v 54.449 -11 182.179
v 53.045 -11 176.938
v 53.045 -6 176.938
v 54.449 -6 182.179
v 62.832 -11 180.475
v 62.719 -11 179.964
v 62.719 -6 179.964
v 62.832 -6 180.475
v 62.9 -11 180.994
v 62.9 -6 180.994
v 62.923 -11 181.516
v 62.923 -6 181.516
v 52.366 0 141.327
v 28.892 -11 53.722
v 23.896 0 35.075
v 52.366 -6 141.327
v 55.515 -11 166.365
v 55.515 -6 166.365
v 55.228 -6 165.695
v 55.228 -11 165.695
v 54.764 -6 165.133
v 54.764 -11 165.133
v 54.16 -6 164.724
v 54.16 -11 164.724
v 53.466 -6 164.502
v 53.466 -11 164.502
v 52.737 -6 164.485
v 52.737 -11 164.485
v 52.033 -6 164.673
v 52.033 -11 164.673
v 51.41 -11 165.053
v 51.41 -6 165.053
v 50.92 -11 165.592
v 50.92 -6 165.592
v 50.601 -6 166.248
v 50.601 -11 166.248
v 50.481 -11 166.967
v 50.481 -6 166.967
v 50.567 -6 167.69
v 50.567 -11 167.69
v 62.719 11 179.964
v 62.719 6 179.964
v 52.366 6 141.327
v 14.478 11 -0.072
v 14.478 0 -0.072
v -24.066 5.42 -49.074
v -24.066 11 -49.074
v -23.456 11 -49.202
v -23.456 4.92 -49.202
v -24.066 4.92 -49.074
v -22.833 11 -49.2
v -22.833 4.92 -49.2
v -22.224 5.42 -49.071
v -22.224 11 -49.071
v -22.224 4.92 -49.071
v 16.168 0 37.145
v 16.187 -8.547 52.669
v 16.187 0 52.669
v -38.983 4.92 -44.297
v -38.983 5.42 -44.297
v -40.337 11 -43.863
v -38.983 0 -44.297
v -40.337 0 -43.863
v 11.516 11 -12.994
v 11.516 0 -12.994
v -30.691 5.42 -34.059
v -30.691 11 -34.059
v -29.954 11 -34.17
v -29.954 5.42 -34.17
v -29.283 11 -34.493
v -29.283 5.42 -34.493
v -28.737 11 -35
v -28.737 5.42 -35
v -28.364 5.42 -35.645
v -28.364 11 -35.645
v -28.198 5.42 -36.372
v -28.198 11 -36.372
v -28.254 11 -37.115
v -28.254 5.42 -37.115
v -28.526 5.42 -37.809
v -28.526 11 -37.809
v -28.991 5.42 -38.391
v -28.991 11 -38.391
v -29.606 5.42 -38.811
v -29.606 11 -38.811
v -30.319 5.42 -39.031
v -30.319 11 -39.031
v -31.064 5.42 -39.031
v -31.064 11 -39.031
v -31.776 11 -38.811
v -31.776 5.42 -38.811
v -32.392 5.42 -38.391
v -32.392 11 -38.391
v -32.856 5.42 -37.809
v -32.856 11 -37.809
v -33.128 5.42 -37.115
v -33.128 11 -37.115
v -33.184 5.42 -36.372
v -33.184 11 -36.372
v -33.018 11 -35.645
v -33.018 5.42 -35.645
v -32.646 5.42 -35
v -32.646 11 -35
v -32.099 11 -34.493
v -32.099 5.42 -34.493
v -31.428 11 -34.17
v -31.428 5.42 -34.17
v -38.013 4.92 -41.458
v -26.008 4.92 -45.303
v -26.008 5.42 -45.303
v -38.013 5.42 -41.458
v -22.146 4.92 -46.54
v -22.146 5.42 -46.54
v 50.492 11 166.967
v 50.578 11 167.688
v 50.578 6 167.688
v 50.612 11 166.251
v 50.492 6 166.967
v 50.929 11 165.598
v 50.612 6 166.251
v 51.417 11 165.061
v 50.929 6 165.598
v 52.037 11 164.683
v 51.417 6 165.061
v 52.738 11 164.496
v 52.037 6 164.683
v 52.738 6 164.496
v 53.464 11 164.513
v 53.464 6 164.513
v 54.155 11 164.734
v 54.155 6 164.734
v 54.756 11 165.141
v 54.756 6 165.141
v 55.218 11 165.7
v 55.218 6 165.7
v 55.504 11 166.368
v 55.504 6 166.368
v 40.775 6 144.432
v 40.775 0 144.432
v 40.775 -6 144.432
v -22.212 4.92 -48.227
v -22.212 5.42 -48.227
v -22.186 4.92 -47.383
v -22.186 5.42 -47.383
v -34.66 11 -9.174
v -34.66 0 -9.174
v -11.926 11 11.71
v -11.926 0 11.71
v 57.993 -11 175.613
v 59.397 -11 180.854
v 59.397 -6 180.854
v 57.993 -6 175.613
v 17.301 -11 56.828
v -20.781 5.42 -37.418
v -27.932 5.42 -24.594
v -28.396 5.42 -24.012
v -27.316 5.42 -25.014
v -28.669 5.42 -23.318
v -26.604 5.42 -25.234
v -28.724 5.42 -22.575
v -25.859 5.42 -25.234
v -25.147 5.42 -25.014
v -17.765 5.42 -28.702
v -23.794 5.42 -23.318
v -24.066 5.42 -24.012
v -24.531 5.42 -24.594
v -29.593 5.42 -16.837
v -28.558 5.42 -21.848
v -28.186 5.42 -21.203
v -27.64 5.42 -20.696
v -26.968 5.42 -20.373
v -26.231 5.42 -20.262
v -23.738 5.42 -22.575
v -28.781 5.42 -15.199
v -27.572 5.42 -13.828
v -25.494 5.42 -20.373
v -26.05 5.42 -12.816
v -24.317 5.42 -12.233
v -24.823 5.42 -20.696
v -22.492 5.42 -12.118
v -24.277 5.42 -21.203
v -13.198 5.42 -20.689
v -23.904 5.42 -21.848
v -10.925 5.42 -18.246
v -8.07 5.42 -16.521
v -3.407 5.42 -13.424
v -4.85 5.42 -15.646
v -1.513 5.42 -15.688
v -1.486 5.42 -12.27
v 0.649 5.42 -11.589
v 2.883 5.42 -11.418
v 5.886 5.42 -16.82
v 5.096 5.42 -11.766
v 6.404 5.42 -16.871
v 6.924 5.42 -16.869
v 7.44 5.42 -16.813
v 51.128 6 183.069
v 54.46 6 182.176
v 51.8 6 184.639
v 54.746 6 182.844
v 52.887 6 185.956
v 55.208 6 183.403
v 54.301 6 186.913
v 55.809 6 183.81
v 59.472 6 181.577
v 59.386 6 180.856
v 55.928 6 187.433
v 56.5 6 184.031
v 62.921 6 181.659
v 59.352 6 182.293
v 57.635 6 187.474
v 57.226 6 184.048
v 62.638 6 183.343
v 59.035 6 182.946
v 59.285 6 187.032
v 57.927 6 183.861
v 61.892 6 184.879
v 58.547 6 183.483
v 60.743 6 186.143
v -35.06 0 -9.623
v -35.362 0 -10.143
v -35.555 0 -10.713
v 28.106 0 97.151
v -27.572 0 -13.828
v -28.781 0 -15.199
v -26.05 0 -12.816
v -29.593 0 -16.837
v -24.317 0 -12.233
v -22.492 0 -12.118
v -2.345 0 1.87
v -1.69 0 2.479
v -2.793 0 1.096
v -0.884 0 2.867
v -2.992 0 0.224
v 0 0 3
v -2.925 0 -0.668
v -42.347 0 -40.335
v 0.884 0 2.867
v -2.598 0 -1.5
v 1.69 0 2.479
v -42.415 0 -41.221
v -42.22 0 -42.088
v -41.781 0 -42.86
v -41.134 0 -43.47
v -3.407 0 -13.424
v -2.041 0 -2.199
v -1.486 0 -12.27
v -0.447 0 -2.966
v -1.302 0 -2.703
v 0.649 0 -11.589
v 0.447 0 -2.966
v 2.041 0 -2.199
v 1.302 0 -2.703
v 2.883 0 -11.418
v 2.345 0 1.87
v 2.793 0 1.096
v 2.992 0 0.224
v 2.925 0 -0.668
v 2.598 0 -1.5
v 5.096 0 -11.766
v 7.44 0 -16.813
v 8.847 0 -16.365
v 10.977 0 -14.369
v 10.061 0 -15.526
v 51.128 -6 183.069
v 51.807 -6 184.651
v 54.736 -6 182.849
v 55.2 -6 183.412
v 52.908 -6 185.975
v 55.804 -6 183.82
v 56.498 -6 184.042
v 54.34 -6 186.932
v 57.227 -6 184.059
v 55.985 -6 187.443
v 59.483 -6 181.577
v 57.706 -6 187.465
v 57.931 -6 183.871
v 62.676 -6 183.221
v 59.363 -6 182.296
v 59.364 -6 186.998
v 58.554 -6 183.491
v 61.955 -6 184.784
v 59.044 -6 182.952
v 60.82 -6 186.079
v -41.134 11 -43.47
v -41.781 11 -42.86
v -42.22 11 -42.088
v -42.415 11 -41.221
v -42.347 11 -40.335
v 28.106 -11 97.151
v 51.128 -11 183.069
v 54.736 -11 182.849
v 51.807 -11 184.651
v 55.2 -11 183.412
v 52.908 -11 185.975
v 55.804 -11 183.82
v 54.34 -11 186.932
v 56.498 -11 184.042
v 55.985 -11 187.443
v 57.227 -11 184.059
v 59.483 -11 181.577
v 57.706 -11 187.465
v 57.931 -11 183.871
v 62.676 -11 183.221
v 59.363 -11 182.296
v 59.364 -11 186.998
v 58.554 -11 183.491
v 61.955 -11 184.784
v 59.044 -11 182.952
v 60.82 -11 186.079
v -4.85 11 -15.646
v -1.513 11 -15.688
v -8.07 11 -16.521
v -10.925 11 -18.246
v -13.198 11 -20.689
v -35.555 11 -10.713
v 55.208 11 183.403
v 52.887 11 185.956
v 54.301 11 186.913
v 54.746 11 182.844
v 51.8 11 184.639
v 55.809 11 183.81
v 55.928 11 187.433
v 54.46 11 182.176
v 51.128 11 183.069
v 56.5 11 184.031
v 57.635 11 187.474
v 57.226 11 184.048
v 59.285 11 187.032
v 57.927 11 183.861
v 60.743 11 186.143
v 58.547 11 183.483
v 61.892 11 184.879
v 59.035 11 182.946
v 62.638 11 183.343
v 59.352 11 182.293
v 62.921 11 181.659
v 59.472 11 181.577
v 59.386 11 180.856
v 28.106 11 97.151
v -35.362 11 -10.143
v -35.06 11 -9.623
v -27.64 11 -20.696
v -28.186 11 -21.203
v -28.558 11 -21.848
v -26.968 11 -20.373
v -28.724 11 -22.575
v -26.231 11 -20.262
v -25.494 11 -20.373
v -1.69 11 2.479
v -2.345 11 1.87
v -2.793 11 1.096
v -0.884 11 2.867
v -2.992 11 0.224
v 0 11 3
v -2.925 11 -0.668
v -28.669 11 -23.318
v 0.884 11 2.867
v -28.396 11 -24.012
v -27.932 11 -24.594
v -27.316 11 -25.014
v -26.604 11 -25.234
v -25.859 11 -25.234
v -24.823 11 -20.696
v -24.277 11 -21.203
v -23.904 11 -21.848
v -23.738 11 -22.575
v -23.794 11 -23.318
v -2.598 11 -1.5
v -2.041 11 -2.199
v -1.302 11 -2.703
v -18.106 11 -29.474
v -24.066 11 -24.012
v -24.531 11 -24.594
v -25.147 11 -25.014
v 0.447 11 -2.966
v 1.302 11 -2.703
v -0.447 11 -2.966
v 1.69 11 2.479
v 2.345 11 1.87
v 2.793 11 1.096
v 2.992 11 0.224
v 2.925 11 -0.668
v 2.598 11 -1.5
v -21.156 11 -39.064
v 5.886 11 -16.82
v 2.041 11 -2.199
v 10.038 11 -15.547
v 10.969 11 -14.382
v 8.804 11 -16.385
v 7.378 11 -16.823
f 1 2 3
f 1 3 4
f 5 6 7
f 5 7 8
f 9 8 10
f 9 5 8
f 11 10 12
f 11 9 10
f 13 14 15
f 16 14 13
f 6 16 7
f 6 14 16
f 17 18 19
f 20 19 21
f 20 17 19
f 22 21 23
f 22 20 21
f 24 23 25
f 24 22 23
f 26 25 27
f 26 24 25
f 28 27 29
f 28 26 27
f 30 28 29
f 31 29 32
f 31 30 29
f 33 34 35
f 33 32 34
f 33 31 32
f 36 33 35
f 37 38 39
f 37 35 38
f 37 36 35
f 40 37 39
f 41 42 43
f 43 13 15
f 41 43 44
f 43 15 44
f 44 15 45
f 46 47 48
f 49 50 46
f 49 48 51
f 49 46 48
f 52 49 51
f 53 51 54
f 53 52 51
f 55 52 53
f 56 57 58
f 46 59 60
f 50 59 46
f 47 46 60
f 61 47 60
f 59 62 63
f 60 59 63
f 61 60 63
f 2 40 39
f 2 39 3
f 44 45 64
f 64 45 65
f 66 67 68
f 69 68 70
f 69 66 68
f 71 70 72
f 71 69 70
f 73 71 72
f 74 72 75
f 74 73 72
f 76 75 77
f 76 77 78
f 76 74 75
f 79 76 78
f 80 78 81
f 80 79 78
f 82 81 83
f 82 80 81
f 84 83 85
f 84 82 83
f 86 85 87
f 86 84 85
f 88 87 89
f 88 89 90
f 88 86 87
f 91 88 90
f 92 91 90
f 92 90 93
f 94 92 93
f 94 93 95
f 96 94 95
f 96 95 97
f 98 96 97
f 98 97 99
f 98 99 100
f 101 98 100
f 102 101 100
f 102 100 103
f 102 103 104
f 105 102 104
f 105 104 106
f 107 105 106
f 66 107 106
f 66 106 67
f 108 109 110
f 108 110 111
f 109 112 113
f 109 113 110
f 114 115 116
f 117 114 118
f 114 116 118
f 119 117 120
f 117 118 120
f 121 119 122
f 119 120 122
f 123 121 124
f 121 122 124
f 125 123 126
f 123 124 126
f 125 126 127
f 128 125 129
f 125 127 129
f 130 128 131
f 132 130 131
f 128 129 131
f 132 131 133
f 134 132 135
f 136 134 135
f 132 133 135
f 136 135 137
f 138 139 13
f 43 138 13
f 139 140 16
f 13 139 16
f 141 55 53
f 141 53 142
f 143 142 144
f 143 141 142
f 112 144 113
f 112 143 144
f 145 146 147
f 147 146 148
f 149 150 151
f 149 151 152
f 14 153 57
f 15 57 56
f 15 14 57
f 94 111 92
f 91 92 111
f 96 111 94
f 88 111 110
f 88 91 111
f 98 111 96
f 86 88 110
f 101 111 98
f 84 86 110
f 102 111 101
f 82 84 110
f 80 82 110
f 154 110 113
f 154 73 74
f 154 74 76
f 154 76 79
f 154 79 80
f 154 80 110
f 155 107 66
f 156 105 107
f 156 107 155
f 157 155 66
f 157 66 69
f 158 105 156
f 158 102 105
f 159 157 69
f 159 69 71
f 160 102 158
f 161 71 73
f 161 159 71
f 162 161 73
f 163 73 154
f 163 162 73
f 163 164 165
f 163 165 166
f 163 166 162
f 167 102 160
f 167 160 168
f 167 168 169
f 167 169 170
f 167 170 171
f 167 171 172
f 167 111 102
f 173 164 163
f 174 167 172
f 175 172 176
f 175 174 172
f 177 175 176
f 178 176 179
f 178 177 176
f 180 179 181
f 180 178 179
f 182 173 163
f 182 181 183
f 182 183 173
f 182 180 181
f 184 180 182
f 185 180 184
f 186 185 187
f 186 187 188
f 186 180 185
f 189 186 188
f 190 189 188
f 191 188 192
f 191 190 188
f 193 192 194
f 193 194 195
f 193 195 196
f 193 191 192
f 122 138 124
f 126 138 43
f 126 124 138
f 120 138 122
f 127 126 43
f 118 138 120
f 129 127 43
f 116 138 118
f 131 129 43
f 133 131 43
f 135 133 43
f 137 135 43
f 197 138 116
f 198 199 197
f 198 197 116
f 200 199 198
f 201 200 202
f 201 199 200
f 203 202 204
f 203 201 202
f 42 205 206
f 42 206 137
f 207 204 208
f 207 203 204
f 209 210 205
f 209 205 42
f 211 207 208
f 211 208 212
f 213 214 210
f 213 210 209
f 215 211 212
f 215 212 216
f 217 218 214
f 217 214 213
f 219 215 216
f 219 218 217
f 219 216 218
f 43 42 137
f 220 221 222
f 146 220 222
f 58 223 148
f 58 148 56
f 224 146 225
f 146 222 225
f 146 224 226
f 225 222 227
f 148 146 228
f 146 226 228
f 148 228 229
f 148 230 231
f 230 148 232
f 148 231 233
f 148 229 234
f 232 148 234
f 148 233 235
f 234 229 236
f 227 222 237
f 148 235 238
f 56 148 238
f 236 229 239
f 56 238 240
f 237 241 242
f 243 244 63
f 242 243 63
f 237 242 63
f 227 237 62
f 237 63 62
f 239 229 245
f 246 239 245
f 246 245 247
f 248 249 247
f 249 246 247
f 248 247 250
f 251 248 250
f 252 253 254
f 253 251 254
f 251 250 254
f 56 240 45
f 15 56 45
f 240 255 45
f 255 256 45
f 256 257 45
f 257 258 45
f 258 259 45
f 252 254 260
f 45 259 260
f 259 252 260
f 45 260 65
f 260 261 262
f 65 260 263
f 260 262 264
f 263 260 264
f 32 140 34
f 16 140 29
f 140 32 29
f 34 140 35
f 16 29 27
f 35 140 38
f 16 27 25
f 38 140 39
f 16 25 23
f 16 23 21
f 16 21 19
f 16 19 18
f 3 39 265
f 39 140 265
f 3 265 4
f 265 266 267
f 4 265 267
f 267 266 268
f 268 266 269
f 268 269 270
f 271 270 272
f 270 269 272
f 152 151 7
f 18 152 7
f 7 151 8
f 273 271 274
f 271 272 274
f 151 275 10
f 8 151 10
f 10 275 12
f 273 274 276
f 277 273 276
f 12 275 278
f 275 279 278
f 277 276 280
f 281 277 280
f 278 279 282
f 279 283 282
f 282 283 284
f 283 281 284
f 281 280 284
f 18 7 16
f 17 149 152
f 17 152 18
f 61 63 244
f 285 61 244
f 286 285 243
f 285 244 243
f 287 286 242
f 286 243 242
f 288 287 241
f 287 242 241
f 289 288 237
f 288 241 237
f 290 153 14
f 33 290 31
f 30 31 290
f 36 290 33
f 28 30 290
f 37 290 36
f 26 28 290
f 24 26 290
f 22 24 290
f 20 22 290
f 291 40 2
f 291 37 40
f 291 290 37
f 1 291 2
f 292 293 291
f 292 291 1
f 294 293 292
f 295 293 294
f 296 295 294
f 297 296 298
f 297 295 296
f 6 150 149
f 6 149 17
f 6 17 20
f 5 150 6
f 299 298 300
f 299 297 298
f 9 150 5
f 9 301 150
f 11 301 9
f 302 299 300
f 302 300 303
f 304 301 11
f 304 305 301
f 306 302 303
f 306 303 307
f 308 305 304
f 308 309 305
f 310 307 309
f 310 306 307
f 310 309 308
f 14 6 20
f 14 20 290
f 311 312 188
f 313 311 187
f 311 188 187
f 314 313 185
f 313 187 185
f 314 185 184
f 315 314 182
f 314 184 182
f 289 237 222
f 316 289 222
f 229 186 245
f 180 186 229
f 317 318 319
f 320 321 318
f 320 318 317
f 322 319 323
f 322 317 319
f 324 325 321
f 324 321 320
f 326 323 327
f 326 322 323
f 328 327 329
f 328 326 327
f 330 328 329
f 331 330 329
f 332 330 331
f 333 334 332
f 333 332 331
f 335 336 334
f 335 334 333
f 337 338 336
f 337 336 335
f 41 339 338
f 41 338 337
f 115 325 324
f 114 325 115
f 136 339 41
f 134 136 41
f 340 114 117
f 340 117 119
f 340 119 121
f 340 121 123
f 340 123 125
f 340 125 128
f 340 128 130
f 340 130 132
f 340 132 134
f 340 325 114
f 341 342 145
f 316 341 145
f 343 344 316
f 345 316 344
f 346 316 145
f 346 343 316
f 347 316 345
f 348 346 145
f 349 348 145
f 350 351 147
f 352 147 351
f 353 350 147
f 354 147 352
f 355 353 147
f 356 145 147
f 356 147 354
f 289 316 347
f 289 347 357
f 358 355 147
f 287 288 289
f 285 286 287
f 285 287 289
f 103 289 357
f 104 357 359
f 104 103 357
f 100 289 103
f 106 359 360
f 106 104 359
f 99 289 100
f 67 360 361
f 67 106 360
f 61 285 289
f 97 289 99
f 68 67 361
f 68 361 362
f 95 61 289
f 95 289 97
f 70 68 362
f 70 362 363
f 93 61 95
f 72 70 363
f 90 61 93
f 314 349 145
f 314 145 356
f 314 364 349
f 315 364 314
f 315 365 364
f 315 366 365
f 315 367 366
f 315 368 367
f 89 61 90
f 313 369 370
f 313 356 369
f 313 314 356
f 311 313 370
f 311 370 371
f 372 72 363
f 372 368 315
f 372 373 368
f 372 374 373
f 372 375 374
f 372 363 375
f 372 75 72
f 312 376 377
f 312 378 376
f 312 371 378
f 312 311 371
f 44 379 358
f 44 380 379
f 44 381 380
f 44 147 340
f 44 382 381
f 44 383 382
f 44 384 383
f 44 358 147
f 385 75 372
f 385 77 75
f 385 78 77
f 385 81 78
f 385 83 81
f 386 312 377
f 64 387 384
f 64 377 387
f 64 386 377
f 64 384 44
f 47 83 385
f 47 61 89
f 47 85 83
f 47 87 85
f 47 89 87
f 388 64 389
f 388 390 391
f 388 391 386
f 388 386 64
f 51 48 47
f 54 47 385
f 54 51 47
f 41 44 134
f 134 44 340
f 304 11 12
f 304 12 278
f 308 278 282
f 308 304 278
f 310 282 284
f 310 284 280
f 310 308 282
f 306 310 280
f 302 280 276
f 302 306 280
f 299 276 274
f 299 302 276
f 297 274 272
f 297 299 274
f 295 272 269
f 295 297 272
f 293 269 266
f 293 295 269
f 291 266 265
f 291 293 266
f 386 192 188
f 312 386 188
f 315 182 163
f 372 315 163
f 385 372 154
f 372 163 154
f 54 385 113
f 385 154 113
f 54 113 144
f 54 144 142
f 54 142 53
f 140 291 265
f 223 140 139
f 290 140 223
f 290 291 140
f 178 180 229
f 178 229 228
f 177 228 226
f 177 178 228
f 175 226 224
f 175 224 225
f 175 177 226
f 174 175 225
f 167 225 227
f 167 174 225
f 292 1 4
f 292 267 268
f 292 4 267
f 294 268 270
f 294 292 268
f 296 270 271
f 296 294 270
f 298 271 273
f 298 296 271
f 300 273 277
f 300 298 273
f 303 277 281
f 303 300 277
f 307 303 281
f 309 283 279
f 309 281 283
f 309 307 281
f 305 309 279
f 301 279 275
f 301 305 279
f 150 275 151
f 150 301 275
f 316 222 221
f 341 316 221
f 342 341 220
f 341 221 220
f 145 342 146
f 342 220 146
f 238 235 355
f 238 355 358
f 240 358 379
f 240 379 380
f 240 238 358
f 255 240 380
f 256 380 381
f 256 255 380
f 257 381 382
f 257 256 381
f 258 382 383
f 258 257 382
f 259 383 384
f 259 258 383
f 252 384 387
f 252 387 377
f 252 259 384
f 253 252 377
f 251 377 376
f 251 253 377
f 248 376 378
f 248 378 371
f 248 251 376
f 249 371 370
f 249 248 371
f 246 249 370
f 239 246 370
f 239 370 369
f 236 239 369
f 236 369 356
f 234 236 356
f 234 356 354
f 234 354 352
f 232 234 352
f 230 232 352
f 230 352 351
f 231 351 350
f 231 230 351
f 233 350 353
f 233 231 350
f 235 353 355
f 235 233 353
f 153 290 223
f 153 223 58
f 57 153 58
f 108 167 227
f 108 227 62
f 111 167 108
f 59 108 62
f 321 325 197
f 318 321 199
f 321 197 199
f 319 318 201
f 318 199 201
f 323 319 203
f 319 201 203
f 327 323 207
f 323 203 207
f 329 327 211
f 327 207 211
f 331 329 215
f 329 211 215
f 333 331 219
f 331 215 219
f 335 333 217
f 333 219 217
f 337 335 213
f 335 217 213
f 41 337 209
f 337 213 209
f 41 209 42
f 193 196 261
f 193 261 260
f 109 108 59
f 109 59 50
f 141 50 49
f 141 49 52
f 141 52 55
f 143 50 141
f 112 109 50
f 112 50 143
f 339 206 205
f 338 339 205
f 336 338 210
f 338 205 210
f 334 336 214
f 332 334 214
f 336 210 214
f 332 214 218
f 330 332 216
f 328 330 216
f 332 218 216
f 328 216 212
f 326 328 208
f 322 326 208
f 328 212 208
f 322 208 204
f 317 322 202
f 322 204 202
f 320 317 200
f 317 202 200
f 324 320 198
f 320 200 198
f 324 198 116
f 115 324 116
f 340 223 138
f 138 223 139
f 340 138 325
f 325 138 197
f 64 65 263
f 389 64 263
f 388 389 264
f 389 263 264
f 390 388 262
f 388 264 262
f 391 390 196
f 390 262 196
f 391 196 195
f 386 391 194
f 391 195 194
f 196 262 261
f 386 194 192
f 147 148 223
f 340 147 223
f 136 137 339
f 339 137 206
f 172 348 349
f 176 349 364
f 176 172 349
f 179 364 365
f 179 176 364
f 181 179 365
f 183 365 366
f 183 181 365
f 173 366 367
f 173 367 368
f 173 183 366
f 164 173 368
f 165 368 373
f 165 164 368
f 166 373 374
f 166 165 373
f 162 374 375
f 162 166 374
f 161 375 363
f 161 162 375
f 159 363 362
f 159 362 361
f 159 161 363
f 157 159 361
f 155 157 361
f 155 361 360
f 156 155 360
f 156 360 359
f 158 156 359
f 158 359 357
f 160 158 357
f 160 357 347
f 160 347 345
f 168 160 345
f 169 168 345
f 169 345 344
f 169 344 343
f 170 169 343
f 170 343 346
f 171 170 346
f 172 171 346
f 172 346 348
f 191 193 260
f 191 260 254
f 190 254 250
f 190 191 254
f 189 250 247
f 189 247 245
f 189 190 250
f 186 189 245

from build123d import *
from build123d.topology import SkipClean

# Parameters (mm, degrees)
SKETCH1_R              = 2.5
SKETCH1_R_2            = 3
BOSS_EXTRUDE1_DEPTH    = 11
BOSS_EXTRUDE2_START    = 11
BOSS_EXTRUDE2_DEPTH    = 11
CUT_EXTRUDE8_START     = -5.42
CUT_EXTRUDE8_OUTLINE_R = 2.5
CUT_EXTRUDE8_DEPTH     = 5.42
CUT_EXTRUDE9_DEPTH     = 200.464537277
SKETCH22_W             = 1.692224542
SKETCH22_H             = 1
BOSS_EXTRUDE5_DEPTH    = 5.58
BOSS_EXTRUDE6_START    = 0.5
BOSS_EXTRUDE6_DEPTH    = 0.5
CUT_EXTRUDE11_START    = -5
CUT_EXTRUDE11_DEPTH    = 12
CUT_EXTRUDE12_DEPTH    = 11


# Read off the part's stored shape, not the designer's step: Cut-Extrude8
with BuildPart() as part:
    # Sketch1 → Boss-Extrude1 (new body)
    with BuildSketch(Plane(origin=(0, 0, 0), x_dir=(1, 0, 0), z_dir=(0, 1, 0))):
        with BuildLine():
            Line((-24.065911245, 49.074379963), (-40.33748217, 43.862823975))
            ThreePointArc((-40.33748217, 43.862823975), (-42.029254381, 42.490505115), (-42.346540309, 40.335352706))
            Line((-42.346540309, 40.335352706), (-35.554744394, 10.712738062))
            ThreePointArc((-35.554744394, 10.712738062), (-35.224207157, 9.875429138), (-34.660148596, 9.173874408))
            Line((-34.660148596, 9.173874408), (-11.926083617, -11.710336344))
            Line((-11.926083617, -11.710336344), (28.105920068, -97.151333217))
            Line((28.105920068, -97.151333217), (51.127586716, -183.069362819))
            ThreePointArc((51.127586716, -183.069362819), (58.476055497, -187.312004338), (62.718696966, -179.963535528))
            Line((62.718696966, -179.963535528), (14.478423579, 0.071615722))
            Line((14.478423579, 0.071615722), (11.515517153, 12.994417934))
            ThreePointArc((11.515517153, 12.994417934), (9.45213952, 16.012597514), (5.886229377, 16.819579599))
            Line((5.886229377, 16.819579599), (-1.513417826, 15.688133083))
            ThreePointArc((-1.513417826, 15.688133083), (-8.06952351, 16.520767077), (-13.198183321, 20.688818137))
            ThreePointArc((-13.198183321, 20.688818137), (-19.873214701, 34.19205636), (-22.223775344, 49.070508937))
            ThreePointArc((-22.223775344, 49.070508937), (-23.144538818, 49.217338163), (-24.065911245, 49.074379963))
        make_face()
        with BuildLine():
            ThreePointArc((59.386252708, -180.856460648), (57.583130416, -183.97956007), (54.460030994, -182.176437778))
            Line((54.460030994, -182.176437778), (50.577745318, -167.687550384))
            ThreePointArc((50.577745318, -167.687550384), (52.38086761, -164.564450962), (55.503967032, -166.367573254))
            Line((55.503967032, -166.367573254), (59.386252708, -180.856460648))
        make_face(mode=Mode.SUBTRACT)
        with Locations(Location((-26.231262377, 22.76176979, 0), (0, 0, 270))):
            Circle(SKETCH1_R, mode=Mode.SUBTRACT)
        with BuildLine():
            Line((-32.594396249, 32.813795701), (-31.813835797, 32.992760568))
            ThreePointArc((-31.813835797, 32.992760568), (-32.198538906, 32.878953378), (-32.594396249, 32.813795701))
        make_face(mode=Mode.SUBTRACT)
        with Locations(Location((-30.69116896, 36.558843149, 0), (0, 0, 270))):
            Circle(SKETCH1_R, mode=Mode.SUBTRACT)
        with Locations(Location((0, 0, 0), (0, 0, 270))):
            Circle(SKETCH1_R_2, mode=Mode.SUBTRACT)
    extrude(amount=BOSS_EXTRUDE1_DEPTH)

    # Sketch15 → Boss-Extrude2 (add)
    with SkipClean():  # the faces are left unmerged after this step: merging them gives an invalid solid
        with BuildSketch(Plane.XZ.offset(BOSS_EXTRUDE2_START)):
            with BuildLine():
                ThreePointArc((62.718696809, 179.963534942), (60.986991622, 177.102253359), (57.992587901, 175.612528046))
                Line((57.992587901, 175.612528046), (55.514643215, 166.364712579))
                ThreePointArc((55.514643215, 166.364712579), (52.378006935, 164.553774778), (50.567069134, 167.690411058))
                Line((50.567069134, 167.690411058), (53.04501382, 176.938226526))
                ThreePointArc((53.04501382, 176.938226526), (51.196646785, 179.725568352), (51.127586894, 183.069363484))
                Line((51.127586894, 183.069363484), (28.105920068, 97.151333217))
                Line((28.105920068, 97.151333217), (12.304730128, 38.18048954))
                Line((12.304730128, 38.18048954), (23.895840044, 35.074660999))
                Line((23.895840044, 35.074660999), (62.718696809, 179.963534942))
            make_face()
            with BuildLine():
                ThreePointArc((54.449354811, 182.179298453), (57.585991091, 183.990236254), (59.396928892, 180.853599973))
                Line((59.396928892, 180.853599973), (57.992587901, 175.612528046))
                ThreePointArc((57.992587901, 175.612528046), (60.986991622, 177.102253359), (62.718696809, 179.963534942))
                ThreePointArc((62.718696809, 179.963534942), (62.87181102, 180.73329206), (62.923141851, 181.516449213))
                ThreePointArc((62.923141851, 181.516449213), (57.706299005, 187.465118381), (51.127586894, 183.069363484))
                ThreePointArc((51.127586894, 183.069363484), (51.196646785, 179.725568352), (53.04501382, 176.938226526))
                Line((53.04501382, 176.938226526), (54.449354811, 182.179298453))
            make_face()
        extrude(amount=-BOSS_EXTRUDE2_DEPTH)

    # Cut-Extrude8 outline → Cut-Extrude8 (cut)
    with SkipClean():  # the faces are left unmerged after this step: merging them gives an invalid solid
        with BuildSketch(Plane.XZ.offset(CUT_EXTRUDE8_START)):
            with BuildLine():
                Line((7.440475273, -16.812852061), (5.096097174, -11.765824195))
                ThreePointArc((5.096097174, -11.765824195), (0.648562626, -11.588913559), (-3.406606041, -13.423979773))
                Line((-3.406606041, -13.423979773), (-22.492177879, -12.118359456))
                ThreePointArc((-22.492177879, -12.118359456), (-26.84408445, -13.271868588), (-29.593378831, -16.837125174))
                Line((-29.593378831, -16.837125174), (-38.983226386, -44.296573112))
                Line((-38.983226386, -44.296573112), (-24.065911245, -49.074379963))
                ThreePointArc((-24.065911245, -49.074379963), (-23.144538818, -49.217338163), (-22.223775344, -49.070508937))
                ThreePointArc((-22.223775344, -49.070508937), (-19.873214666, -34.19205625), (-13.198183188, -20.688817948))
                ThreePointArc((-13.198183188, -20.688817948), (-8.069523818, -16.520767209), (-1.513418717, -15.688132947))
                Line((-1.513418717, -15.688132947), (5.886229377, -16.819579599))
                ThreePointArc((5.886229377, -16.819579599), (6.663615332, -16.876977606), (7.440475273, -16.812852061))
            make_face()
            with Locations((-30.69116896, -36.558843149)):
                Circle(CUT_EXTRUDE8_OUTLINE_R, mode=Mode.SUBTRACT)
            with BuildLine():
                Line((-31.813835797, -32.992760568), (-32.594396249, -32.813795701))
                ThreePointArc((-32.594396249, -32.813795701), (-32.198538906, -32.878953378), (-31.813835797, -32.992760568))
            make_face(mode=Mode.SUBTRACT)
            with Locations((-26.231262377, -22.76176979)):
                Circle(CUT_EXTRUDE8_OUTLINE_R, mode=Mode.SUBTRACT)
        extrude(amount=CUT_EXTRUDE8_DEPTH, mode=Mode.SUBTRACT)

    # Sketch19 → Cut-Extrude9 (cut, through all)
    with SkipClean():  # the faces are left unmerged after this step: merging them gives an invalid solid
        with BuildSketch(Plane(origin=(13.526457033, 0, -3.624403239), x_dir=(-0.2588190451025201, 0, -0.9659258262890685), z_dir=(0.9659258262890686, 0, -0.2588190451025201))):
            Polygon((-59.369639824, -11), (-40.064219409, 0), (-40.064219409, -11), align=None)
        extrude(amount=-CUT_EXTRUDE9_DEPTH, mode=Mode.SUBTRACT)

    # Sketch22 → Boss-Extrude5 (add, through all)
    with SkipClean():  # the faces are left unmerged after this step: merging them gives an invalid solid
        with BuildSketch(Plane.XZ.offset(-5.42)):
            with Locations((-32.253882585, -32.818926128)):
                Rectangle(SKETCH22_W, SKETCH22_H)
        extrude(amount=-BOSS_EXTRUDE5_DEPTH)

    # Sketch23 → Boss-Extrude6 (add)
    with SkipClean():  # the faces are left unmerged after this step: merging them gives an invalid solid
        with BuildSketch(Plane.XZ.offset(-5.42).offset(BOSS_EXTRUDE6_START)):
            with BuildLine():
                Line((-26.008052503, -45.302821126), (-38.012549647, -41.457949032))
                Line((-38.012549647, -41.457949032), (-38.983226386, -44.296573112))
                Line((-38.983226386, -44.296573112), (-24.065911245, -49.074379963))
                ThreePointArc((-24.065911245, -49.074379963), (-25.817991998, -47.590776952), (-26.008052503, -45.302821126))
            make_face()
            with BuildLine():
                Line((-22.14579331, -46.539848584), (-26.008052503, -45.302821126))
                ThreePointArc((-26.008052503, -45.302821126), (-25.817991998, -47.590776952), (-24.065911245, -49.074379963))
                ThreePointArc((-24.065911245, -49.074379963), (-23.144538818, -49.217338163), (-22.223775344, -49.070508937))
                ThreePointArc((-22.223775344, -49.070508937), (-22.200805099, -47.804685082), (-22.14579331, -46.539848584))
            make_face()
        extrude(amount=-BOSS_EXTRUDE6_DEPTH)

    # Sketch26 → Cut-Extrude11 (cut)
    with BuildSketch(Plane.XZ.offset(11).offset(CUT_EXTRUDE11_START)):
        Polygon((184.237099145, 679.840826179), (51.127586894, 183.069363484), (40.774825089, 144.432330432), (52.365935005, 141.326501891), (62.718696809, 179.963534942), (195.828209061, 676.734997637), (462.047233565, 1670.277923027), (450.456123649, 1673.383751569), align=None)
    extrude(amount=-CUT_EXTRUDE11_DEPTH, mode=Mode.SUBTRACT)

    # Sketch27 → Cut-Extrude12 (cut)
    with BuildSketch(Plane.XZ.offset(11)):
        Polygon((12.304730128, 38.18048954), (16.187015805, 52.669376935), (16.168433433, 37.14521336), align=None)
    extrude(amount=-CUT_EXTRUDE12_DEPTH, mode=Mode.SUBTRACT)


solid = part.part
